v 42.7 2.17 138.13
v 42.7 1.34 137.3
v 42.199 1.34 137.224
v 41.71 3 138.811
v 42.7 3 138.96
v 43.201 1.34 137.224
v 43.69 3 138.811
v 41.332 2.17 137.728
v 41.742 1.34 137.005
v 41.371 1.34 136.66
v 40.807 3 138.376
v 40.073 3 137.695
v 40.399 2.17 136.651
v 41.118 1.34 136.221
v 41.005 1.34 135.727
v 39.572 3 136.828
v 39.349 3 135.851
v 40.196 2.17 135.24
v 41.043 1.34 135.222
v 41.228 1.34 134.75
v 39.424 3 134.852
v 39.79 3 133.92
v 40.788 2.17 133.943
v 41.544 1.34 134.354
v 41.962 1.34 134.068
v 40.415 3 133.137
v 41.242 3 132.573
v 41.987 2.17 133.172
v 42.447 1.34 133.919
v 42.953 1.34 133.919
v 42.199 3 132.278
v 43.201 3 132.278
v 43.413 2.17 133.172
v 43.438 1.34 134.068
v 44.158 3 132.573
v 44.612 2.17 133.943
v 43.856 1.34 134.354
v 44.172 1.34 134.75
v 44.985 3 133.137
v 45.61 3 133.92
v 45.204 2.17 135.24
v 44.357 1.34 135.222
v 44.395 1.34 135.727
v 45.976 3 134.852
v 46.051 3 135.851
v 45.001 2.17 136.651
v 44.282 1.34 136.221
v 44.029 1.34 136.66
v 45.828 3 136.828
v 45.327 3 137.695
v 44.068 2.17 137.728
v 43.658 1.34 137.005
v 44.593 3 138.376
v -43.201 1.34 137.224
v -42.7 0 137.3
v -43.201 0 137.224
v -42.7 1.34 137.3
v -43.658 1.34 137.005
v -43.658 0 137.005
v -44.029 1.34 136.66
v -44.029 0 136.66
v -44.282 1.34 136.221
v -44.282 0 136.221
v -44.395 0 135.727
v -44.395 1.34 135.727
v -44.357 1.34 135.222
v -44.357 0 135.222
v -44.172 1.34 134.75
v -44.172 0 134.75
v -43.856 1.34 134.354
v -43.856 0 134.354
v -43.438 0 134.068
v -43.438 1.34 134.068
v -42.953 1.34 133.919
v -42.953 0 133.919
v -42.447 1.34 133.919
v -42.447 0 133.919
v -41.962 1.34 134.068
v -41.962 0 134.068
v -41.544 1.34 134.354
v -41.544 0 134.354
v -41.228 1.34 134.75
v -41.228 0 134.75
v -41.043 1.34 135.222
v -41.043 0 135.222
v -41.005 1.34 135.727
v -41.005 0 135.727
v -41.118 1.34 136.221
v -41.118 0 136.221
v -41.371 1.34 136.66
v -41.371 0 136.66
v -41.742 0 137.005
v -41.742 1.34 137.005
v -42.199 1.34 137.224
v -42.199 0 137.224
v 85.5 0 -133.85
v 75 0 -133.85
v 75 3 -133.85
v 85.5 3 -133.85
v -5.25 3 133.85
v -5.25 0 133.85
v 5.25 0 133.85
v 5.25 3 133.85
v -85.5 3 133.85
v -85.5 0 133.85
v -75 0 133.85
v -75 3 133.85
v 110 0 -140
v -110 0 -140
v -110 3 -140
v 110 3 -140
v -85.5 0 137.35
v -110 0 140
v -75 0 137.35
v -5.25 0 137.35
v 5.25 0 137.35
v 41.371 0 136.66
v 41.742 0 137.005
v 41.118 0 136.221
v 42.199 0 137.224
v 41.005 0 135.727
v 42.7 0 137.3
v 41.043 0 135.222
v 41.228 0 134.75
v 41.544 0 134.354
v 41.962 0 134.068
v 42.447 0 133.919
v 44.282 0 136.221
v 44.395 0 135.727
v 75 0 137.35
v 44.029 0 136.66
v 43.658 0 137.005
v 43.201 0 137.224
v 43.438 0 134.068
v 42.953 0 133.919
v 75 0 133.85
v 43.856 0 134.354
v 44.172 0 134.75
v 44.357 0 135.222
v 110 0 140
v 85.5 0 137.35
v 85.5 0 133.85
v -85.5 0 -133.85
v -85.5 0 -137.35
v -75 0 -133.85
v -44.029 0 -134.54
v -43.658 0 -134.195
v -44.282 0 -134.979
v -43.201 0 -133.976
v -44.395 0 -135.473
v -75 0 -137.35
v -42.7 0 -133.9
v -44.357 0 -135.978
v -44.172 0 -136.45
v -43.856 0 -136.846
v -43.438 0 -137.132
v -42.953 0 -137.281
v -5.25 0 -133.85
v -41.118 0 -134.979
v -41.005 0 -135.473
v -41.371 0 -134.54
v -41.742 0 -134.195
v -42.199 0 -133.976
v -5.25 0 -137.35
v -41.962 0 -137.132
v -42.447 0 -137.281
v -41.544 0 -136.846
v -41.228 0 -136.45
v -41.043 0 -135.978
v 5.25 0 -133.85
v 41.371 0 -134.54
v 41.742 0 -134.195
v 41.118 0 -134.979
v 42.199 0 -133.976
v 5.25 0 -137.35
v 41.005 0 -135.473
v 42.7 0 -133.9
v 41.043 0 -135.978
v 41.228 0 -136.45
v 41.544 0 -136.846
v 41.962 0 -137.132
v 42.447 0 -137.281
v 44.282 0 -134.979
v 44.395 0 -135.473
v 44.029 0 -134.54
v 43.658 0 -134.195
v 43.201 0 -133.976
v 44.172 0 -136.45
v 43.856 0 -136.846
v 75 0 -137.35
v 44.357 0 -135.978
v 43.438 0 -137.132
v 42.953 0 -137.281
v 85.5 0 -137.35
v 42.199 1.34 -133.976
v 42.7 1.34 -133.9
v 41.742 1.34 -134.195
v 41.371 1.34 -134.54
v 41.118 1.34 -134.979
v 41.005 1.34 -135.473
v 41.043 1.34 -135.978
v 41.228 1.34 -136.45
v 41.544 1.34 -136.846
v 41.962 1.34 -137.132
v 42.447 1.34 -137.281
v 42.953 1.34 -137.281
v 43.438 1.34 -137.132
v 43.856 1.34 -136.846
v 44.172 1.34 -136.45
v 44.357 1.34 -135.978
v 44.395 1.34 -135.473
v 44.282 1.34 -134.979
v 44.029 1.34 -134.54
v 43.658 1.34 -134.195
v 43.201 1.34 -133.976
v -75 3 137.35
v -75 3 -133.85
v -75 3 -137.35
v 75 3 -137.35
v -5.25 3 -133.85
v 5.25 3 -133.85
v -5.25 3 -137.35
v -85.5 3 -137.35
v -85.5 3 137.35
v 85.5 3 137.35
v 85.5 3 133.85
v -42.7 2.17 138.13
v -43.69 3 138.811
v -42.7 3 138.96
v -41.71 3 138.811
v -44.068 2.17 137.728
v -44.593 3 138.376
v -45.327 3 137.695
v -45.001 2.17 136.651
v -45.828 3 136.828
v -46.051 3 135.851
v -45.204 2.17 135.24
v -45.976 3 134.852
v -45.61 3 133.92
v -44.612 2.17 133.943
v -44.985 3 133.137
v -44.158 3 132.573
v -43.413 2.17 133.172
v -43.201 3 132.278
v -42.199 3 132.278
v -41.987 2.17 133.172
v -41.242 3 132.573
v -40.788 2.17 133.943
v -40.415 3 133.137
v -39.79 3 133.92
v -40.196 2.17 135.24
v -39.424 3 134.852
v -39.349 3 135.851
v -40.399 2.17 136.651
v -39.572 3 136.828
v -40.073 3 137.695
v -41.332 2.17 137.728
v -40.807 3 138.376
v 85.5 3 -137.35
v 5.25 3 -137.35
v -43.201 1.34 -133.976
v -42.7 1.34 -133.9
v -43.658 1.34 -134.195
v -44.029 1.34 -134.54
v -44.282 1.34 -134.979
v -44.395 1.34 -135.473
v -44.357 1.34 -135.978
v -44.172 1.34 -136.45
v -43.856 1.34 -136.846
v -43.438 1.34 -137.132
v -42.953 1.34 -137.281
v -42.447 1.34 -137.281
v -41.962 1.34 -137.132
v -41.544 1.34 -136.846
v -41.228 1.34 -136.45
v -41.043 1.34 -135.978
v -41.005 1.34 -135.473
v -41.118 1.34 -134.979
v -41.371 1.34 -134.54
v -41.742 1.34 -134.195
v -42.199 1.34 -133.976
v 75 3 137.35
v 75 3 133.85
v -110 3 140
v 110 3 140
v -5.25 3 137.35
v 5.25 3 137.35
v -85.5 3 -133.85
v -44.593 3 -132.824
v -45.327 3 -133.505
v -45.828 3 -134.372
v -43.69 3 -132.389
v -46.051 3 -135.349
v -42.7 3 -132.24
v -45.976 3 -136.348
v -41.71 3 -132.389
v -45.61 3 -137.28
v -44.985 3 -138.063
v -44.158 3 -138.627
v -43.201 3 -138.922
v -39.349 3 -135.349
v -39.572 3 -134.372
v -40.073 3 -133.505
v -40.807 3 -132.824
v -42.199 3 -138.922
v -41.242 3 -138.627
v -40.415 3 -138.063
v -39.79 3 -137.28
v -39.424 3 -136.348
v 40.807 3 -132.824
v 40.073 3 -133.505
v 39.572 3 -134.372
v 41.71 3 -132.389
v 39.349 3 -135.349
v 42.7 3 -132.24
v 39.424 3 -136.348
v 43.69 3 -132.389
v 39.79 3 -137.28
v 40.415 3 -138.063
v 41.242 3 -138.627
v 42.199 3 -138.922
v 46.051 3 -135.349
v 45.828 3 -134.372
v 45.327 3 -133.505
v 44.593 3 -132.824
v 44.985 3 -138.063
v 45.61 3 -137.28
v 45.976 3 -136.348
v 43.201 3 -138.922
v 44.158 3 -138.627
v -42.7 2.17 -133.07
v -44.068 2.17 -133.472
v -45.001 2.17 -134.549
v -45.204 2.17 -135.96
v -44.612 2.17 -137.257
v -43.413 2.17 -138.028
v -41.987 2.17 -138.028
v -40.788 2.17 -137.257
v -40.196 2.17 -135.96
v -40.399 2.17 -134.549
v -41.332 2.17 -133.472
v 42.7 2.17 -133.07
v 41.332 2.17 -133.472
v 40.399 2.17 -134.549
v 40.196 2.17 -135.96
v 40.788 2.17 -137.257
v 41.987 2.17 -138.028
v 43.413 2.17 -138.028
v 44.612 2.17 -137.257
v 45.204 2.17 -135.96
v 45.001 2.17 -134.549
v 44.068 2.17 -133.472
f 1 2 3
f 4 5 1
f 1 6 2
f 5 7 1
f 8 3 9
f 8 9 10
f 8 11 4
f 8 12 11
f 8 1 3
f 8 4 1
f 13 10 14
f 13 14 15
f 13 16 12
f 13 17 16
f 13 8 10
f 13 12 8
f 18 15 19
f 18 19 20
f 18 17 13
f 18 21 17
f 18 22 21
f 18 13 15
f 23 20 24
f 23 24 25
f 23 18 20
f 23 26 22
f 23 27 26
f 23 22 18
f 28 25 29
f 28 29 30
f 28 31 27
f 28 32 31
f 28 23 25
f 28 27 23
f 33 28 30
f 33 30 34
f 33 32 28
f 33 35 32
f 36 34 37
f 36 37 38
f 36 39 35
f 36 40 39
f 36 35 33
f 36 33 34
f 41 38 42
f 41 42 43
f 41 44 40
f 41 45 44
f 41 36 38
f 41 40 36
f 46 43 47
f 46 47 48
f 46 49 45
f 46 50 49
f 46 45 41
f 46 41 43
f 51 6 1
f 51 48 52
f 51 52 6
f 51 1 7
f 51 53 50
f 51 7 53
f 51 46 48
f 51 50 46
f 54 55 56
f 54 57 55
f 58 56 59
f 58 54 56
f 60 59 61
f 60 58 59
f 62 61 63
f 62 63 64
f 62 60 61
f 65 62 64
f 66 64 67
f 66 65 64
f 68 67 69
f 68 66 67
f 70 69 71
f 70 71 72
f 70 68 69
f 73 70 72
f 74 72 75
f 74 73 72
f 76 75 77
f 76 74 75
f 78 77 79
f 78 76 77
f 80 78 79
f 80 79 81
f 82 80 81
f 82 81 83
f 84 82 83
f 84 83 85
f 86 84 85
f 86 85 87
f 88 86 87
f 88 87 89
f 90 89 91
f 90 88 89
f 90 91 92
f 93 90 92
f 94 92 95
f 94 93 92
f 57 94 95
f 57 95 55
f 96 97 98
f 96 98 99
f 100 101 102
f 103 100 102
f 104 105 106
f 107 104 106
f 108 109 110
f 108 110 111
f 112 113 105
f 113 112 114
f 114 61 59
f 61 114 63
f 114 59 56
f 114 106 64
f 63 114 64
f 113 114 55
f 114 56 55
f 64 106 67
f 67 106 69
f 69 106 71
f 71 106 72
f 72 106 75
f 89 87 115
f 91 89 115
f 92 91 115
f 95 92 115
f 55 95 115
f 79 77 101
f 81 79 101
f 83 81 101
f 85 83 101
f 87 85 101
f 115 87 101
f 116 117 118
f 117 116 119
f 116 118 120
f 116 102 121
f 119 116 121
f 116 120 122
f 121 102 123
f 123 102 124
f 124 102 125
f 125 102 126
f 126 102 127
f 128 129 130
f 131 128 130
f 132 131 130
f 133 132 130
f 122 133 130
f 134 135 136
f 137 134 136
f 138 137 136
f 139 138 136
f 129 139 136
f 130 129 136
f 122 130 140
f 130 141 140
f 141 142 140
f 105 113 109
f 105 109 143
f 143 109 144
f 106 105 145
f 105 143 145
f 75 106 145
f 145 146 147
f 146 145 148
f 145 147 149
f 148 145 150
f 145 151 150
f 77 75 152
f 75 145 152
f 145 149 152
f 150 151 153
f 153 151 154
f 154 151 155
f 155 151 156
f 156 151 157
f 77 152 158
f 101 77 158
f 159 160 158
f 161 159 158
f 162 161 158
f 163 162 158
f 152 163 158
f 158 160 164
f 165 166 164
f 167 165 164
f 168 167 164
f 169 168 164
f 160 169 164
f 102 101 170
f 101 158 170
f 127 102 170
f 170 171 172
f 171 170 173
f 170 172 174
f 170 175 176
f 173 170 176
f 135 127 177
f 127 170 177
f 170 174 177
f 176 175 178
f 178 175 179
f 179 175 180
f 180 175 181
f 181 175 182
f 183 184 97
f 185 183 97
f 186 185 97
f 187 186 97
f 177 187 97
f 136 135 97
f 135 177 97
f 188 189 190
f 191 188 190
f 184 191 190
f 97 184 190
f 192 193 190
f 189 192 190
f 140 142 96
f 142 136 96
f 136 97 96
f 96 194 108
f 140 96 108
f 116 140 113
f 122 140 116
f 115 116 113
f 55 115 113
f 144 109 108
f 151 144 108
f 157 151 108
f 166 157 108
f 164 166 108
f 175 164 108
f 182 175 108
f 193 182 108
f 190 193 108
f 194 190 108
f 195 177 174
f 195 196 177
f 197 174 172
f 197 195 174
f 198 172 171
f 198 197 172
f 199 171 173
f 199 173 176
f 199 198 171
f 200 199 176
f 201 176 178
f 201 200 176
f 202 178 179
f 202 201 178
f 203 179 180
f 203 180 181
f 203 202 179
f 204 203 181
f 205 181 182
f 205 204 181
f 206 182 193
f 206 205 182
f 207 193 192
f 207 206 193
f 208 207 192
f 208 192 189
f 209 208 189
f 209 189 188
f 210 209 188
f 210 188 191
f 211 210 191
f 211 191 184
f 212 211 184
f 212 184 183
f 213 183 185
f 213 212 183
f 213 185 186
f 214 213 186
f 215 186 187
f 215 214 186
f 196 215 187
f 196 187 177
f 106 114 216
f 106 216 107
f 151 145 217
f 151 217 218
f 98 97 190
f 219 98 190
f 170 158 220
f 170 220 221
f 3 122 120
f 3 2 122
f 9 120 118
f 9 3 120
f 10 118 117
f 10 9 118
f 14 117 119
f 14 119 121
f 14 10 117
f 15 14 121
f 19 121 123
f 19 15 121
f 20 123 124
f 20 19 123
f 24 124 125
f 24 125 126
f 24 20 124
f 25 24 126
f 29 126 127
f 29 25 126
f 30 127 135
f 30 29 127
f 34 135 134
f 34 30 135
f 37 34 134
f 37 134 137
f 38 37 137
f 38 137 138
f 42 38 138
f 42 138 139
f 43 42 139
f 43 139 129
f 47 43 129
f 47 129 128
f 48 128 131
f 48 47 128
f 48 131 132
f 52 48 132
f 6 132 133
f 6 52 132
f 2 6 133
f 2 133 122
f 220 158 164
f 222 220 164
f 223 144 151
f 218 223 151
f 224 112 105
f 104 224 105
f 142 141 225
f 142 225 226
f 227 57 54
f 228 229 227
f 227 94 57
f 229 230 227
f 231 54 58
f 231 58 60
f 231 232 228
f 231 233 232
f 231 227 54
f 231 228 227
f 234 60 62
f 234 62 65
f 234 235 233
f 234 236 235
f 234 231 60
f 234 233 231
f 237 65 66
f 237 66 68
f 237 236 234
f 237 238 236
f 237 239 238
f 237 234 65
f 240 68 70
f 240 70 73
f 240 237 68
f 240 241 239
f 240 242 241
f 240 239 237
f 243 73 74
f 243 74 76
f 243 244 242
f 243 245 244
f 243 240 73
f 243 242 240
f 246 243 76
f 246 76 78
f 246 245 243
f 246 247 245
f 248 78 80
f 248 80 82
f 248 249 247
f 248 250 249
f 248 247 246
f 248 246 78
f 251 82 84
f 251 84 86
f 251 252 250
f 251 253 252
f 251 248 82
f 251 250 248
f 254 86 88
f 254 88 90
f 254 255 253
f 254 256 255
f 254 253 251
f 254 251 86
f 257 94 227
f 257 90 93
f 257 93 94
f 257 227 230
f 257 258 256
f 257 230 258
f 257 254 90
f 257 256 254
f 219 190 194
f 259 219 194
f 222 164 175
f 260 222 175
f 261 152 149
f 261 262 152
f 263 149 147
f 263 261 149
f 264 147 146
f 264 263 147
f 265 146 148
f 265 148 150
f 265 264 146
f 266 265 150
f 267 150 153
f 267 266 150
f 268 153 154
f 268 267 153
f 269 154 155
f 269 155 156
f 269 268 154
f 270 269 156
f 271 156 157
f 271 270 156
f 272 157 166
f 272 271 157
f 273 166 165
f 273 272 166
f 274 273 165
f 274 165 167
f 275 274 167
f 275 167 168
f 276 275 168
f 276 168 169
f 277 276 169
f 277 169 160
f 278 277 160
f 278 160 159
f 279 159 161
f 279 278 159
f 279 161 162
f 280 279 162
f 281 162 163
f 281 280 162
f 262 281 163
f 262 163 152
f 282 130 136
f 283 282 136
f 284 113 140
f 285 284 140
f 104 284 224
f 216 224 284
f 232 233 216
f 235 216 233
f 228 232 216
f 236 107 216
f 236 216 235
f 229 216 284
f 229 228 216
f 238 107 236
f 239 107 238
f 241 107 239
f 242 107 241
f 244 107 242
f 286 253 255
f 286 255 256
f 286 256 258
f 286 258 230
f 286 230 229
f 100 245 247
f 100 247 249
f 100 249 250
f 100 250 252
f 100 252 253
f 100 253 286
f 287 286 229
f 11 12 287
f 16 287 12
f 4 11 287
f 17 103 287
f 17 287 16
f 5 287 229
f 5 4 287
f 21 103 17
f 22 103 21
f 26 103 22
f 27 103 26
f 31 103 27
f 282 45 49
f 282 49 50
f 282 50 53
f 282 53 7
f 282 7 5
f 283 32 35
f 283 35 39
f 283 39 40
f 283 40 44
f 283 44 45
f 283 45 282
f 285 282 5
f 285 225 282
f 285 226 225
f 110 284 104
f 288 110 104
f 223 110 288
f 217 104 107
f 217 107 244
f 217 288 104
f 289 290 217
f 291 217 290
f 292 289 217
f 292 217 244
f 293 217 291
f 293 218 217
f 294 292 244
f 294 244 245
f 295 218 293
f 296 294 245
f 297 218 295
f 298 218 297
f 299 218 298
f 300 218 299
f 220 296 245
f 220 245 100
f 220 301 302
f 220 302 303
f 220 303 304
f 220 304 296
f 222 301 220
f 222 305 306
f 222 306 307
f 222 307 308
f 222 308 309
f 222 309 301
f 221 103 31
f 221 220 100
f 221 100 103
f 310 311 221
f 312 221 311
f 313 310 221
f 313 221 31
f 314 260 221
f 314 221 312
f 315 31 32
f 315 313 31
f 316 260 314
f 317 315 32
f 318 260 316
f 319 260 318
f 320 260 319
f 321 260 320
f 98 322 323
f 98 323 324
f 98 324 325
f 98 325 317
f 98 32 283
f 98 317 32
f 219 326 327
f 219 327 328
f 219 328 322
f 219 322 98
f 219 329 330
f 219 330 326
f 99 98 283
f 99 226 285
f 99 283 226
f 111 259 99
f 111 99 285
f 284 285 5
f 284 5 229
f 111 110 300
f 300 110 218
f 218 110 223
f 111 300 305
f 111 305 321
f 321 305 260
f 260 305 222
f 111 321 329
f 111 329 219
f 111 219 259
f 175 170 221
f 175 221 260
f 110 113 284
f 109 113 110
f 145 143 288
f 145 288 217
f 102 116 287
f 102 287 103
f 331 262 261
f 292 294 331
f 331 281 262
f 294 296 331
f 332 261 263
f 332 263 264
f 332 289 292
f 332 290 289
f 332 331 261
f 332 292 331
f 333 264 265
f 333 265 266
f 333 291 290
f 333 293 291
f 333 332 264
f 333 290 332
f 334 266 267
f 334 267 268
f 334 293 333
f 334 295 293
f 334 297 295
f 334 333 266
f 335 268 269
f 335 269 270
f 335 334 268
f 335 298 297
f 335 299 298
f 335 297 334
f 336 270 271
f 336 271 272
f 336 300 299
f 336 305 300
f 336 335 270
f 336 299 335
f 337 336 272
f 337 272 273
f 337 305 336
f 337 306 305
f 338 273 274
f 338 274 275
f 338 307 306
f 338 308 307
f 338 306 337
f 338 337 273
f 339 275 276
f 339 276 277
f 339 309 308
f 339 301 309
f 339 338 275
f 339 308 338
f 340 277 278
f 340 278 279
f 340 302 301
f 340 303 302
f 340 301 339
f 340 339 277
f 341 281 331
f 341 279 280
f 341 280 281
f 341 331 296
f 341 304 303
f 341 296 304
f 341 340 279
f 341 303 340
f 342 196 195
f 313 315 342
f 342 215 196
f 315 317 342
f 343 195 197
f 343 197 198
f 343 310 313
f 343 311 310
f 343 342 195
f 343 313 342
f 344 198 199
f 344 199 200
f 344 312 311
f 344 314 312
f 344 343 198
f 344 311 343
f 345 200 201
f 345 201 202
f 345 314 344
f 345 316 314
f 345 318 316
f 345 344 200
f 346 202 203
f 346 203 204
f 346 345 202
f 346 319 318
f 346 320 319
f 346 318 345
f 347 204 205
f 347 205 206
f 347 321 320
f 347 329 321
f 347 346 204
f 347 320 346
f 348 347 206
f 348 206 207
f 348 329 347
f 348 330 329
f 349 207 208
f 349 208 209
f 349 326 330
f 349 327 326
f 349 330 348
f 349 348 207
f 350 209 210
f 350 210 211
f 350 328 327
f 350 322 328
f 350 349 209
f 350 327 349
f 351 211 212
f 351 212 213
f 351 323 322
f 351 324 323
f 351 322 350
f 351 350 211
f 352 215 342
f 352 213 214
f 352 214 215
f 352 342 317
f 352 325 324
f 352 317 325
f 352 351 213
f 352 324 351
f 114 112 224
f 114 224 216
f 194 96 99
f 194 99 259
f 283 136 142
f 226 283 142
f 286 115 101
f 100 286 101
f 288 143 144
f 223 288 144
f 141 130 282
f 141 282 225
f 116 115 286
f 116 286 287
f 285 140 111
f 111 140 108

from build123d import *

# Parameters (mm, degrees)
CROQUIS1_W                                   = 220
CROQUIS1_H                                   = 280
CROQUIS1_R                                   = 1
CROQUIS1_W_2                                 = 10.5
CROQUIS1_H_2                                 = 3.5
SALIENTE_EXTRUIR1_DEPTH                      = 3
REFRENTADO_PARA_TORNILLO_TAP_N_CON_C_2_COUNT = 2
REFRENTADO_PARA_TORNILLO_TAP_N_CON_C_2_PITCH = 85.4
REFRENTADO_PARA_TORNILLO_TAP_N_CON_C_3_COUNT = 2
REFRENTADO_PARA_TORNILLO_TAP_N_CON_C_3_PITCH = 271.2
REFRENTADO_PARA_TORNILLO_TAP_N_CON_C_4_COUNT = 2
REFRENTADO_PARA_TORNILLO_TAP_N_CON_C_4_PITCH = 284.328331335


with BuildPart() as part:
    # Croquis1 → Saliente-Extruir1 (new body)
    with BuildSketch(Plane(origin=(0, 0, 0), x_dir=(1, 0, 0), z_dir=(0, 1, 0))):
        Rectangle(CROQUIS1_W, CROQUIS1_H)
        with Locations(Location((-42.7, -135.6, 0), (0, 0, 270))):
            Circle(CROQUIS1_R, mode=Mode.SUBTRACT)
        with Locations(Location((42.7, -135.6, 0), (0, 0, 90))):
            Circle(CROQUIS1_R, mode=Mode.SUBTRACT)
        with Locations(Location((42.7, 135.6, 0), (0, 0, 270))):
            Circle(CROQUIS1_R, mode=Mode.SUBTRACT)
        with Locations(Location((-42.7, 135.6, 0), (0, 0, 90))):
            Circle(CROQUIS1_R, mode=Mode.SUBTRACT)
        with Locations((-80.25, -135.6)):
            Rectangle(CROQUIS1_W_2, CROQUIS1_H_2, mode=Mode.SUBTRACT)
        with Locations((0, -135.6)):
            Rectangle(CROQUIS1_W_2, CROQUIS1_H_2, mode=Mode.SUBTRACT)
        with Locations((80.25, -135.6)):
            Rectangle(CROQUIS1_W_2, CROQUIS1_H_2, mode=Mode.SUBTRACT)
        with Locations((0, 135.6)):
            Rectangle(CROQUIS1_W_2, CROQUIS1_H_2, mode=Mode.SUBTRACT)
        with Locations((80.25, 135.6)):
            Rectangle(CROQUIS1_W_2, CROQUIS1_H_2, mode=Mode.SUBTRACT)
        with Locations((-80.25, 135.6)):
            Rectangle(CROQUIS1_W_2, CROQUIS1_H_2, mode=Mode.SUBTRACT)
    extrude(amount=SALIENTE_EXTRUIR1_DEPTH)

    # Croquis2 → Refrentado para tornillo tapón con cabeza plana de clavija de M31 (revolve, cut)
    with BuildSketch(Plane(origin=(-42.7, 3, 135.6), x_dir=(0, 0, 1), z_dir=(1, 0, 0))):
        Polygon((0, 0), (0, 3), (1.7, 3), (1.7, 1.66), (3.36, 0), align=None)
    refrentado_para_tornillo_tap_n_con_cabez = revolve(axis=Axis((-42.7, 9.35, 135.6), (0, -1, 0)), mode=Mode.SUBTRACT)

    # Refrentado para tornillo tap_n con c 2: Refrentado para tornillo tapón con cabeza plana de clavija de M31 ×2
    with Locations(*[(i * REFRENTADO_PARA_TORNILLO_TAP_N_CON_C_2_PITCH, 0, 0) for i in range(1, REFRENTADO_PARA_TORNILLO_TAP_N_CON_C_2_COUNT)]):
        add(refrentado_para_tornillo_tap_n_con_cabez, mode=Mode.SUBTRACT)

    # Refrentado para tornillo tap_n con c 3: Refrentado para tornillo tapón con cabeza plana de clavija de M31 ×2
    with Locations(*[(0, 0, -i * REFRENTADO_PARA_TORNILLO_TAP_N_CON_C_3_PITCH) for i in range(1, REFRENTADO_PARA_TORNILLO_TAP_N_CON_C_3_COUNT)]):
        add(refrentado_para_tornillo_tap_n_con_cabez, mode=Mode.SUBTRACT)

    # Refrentado para tornillo tap_n con c 4: Refrentado para tornillo tapón con cabeza plana de clavija de M31 ×2
    with Locations(*[Vector(0.3003569837690427, 0, -0.9538268618052037) * (i * REFRENTADO_PARA_TORNILLO_TAP_N_CON_C_4_PITCH) for i in range(1, REFRENTADO_PARA_TORNILLO_TAP_N_CON_C_4_COUNT)]):
        add(refrentado_para_tornillo_tap_n_con_cabez, mode=Mode.SUBTRACT)


solid = part.part
